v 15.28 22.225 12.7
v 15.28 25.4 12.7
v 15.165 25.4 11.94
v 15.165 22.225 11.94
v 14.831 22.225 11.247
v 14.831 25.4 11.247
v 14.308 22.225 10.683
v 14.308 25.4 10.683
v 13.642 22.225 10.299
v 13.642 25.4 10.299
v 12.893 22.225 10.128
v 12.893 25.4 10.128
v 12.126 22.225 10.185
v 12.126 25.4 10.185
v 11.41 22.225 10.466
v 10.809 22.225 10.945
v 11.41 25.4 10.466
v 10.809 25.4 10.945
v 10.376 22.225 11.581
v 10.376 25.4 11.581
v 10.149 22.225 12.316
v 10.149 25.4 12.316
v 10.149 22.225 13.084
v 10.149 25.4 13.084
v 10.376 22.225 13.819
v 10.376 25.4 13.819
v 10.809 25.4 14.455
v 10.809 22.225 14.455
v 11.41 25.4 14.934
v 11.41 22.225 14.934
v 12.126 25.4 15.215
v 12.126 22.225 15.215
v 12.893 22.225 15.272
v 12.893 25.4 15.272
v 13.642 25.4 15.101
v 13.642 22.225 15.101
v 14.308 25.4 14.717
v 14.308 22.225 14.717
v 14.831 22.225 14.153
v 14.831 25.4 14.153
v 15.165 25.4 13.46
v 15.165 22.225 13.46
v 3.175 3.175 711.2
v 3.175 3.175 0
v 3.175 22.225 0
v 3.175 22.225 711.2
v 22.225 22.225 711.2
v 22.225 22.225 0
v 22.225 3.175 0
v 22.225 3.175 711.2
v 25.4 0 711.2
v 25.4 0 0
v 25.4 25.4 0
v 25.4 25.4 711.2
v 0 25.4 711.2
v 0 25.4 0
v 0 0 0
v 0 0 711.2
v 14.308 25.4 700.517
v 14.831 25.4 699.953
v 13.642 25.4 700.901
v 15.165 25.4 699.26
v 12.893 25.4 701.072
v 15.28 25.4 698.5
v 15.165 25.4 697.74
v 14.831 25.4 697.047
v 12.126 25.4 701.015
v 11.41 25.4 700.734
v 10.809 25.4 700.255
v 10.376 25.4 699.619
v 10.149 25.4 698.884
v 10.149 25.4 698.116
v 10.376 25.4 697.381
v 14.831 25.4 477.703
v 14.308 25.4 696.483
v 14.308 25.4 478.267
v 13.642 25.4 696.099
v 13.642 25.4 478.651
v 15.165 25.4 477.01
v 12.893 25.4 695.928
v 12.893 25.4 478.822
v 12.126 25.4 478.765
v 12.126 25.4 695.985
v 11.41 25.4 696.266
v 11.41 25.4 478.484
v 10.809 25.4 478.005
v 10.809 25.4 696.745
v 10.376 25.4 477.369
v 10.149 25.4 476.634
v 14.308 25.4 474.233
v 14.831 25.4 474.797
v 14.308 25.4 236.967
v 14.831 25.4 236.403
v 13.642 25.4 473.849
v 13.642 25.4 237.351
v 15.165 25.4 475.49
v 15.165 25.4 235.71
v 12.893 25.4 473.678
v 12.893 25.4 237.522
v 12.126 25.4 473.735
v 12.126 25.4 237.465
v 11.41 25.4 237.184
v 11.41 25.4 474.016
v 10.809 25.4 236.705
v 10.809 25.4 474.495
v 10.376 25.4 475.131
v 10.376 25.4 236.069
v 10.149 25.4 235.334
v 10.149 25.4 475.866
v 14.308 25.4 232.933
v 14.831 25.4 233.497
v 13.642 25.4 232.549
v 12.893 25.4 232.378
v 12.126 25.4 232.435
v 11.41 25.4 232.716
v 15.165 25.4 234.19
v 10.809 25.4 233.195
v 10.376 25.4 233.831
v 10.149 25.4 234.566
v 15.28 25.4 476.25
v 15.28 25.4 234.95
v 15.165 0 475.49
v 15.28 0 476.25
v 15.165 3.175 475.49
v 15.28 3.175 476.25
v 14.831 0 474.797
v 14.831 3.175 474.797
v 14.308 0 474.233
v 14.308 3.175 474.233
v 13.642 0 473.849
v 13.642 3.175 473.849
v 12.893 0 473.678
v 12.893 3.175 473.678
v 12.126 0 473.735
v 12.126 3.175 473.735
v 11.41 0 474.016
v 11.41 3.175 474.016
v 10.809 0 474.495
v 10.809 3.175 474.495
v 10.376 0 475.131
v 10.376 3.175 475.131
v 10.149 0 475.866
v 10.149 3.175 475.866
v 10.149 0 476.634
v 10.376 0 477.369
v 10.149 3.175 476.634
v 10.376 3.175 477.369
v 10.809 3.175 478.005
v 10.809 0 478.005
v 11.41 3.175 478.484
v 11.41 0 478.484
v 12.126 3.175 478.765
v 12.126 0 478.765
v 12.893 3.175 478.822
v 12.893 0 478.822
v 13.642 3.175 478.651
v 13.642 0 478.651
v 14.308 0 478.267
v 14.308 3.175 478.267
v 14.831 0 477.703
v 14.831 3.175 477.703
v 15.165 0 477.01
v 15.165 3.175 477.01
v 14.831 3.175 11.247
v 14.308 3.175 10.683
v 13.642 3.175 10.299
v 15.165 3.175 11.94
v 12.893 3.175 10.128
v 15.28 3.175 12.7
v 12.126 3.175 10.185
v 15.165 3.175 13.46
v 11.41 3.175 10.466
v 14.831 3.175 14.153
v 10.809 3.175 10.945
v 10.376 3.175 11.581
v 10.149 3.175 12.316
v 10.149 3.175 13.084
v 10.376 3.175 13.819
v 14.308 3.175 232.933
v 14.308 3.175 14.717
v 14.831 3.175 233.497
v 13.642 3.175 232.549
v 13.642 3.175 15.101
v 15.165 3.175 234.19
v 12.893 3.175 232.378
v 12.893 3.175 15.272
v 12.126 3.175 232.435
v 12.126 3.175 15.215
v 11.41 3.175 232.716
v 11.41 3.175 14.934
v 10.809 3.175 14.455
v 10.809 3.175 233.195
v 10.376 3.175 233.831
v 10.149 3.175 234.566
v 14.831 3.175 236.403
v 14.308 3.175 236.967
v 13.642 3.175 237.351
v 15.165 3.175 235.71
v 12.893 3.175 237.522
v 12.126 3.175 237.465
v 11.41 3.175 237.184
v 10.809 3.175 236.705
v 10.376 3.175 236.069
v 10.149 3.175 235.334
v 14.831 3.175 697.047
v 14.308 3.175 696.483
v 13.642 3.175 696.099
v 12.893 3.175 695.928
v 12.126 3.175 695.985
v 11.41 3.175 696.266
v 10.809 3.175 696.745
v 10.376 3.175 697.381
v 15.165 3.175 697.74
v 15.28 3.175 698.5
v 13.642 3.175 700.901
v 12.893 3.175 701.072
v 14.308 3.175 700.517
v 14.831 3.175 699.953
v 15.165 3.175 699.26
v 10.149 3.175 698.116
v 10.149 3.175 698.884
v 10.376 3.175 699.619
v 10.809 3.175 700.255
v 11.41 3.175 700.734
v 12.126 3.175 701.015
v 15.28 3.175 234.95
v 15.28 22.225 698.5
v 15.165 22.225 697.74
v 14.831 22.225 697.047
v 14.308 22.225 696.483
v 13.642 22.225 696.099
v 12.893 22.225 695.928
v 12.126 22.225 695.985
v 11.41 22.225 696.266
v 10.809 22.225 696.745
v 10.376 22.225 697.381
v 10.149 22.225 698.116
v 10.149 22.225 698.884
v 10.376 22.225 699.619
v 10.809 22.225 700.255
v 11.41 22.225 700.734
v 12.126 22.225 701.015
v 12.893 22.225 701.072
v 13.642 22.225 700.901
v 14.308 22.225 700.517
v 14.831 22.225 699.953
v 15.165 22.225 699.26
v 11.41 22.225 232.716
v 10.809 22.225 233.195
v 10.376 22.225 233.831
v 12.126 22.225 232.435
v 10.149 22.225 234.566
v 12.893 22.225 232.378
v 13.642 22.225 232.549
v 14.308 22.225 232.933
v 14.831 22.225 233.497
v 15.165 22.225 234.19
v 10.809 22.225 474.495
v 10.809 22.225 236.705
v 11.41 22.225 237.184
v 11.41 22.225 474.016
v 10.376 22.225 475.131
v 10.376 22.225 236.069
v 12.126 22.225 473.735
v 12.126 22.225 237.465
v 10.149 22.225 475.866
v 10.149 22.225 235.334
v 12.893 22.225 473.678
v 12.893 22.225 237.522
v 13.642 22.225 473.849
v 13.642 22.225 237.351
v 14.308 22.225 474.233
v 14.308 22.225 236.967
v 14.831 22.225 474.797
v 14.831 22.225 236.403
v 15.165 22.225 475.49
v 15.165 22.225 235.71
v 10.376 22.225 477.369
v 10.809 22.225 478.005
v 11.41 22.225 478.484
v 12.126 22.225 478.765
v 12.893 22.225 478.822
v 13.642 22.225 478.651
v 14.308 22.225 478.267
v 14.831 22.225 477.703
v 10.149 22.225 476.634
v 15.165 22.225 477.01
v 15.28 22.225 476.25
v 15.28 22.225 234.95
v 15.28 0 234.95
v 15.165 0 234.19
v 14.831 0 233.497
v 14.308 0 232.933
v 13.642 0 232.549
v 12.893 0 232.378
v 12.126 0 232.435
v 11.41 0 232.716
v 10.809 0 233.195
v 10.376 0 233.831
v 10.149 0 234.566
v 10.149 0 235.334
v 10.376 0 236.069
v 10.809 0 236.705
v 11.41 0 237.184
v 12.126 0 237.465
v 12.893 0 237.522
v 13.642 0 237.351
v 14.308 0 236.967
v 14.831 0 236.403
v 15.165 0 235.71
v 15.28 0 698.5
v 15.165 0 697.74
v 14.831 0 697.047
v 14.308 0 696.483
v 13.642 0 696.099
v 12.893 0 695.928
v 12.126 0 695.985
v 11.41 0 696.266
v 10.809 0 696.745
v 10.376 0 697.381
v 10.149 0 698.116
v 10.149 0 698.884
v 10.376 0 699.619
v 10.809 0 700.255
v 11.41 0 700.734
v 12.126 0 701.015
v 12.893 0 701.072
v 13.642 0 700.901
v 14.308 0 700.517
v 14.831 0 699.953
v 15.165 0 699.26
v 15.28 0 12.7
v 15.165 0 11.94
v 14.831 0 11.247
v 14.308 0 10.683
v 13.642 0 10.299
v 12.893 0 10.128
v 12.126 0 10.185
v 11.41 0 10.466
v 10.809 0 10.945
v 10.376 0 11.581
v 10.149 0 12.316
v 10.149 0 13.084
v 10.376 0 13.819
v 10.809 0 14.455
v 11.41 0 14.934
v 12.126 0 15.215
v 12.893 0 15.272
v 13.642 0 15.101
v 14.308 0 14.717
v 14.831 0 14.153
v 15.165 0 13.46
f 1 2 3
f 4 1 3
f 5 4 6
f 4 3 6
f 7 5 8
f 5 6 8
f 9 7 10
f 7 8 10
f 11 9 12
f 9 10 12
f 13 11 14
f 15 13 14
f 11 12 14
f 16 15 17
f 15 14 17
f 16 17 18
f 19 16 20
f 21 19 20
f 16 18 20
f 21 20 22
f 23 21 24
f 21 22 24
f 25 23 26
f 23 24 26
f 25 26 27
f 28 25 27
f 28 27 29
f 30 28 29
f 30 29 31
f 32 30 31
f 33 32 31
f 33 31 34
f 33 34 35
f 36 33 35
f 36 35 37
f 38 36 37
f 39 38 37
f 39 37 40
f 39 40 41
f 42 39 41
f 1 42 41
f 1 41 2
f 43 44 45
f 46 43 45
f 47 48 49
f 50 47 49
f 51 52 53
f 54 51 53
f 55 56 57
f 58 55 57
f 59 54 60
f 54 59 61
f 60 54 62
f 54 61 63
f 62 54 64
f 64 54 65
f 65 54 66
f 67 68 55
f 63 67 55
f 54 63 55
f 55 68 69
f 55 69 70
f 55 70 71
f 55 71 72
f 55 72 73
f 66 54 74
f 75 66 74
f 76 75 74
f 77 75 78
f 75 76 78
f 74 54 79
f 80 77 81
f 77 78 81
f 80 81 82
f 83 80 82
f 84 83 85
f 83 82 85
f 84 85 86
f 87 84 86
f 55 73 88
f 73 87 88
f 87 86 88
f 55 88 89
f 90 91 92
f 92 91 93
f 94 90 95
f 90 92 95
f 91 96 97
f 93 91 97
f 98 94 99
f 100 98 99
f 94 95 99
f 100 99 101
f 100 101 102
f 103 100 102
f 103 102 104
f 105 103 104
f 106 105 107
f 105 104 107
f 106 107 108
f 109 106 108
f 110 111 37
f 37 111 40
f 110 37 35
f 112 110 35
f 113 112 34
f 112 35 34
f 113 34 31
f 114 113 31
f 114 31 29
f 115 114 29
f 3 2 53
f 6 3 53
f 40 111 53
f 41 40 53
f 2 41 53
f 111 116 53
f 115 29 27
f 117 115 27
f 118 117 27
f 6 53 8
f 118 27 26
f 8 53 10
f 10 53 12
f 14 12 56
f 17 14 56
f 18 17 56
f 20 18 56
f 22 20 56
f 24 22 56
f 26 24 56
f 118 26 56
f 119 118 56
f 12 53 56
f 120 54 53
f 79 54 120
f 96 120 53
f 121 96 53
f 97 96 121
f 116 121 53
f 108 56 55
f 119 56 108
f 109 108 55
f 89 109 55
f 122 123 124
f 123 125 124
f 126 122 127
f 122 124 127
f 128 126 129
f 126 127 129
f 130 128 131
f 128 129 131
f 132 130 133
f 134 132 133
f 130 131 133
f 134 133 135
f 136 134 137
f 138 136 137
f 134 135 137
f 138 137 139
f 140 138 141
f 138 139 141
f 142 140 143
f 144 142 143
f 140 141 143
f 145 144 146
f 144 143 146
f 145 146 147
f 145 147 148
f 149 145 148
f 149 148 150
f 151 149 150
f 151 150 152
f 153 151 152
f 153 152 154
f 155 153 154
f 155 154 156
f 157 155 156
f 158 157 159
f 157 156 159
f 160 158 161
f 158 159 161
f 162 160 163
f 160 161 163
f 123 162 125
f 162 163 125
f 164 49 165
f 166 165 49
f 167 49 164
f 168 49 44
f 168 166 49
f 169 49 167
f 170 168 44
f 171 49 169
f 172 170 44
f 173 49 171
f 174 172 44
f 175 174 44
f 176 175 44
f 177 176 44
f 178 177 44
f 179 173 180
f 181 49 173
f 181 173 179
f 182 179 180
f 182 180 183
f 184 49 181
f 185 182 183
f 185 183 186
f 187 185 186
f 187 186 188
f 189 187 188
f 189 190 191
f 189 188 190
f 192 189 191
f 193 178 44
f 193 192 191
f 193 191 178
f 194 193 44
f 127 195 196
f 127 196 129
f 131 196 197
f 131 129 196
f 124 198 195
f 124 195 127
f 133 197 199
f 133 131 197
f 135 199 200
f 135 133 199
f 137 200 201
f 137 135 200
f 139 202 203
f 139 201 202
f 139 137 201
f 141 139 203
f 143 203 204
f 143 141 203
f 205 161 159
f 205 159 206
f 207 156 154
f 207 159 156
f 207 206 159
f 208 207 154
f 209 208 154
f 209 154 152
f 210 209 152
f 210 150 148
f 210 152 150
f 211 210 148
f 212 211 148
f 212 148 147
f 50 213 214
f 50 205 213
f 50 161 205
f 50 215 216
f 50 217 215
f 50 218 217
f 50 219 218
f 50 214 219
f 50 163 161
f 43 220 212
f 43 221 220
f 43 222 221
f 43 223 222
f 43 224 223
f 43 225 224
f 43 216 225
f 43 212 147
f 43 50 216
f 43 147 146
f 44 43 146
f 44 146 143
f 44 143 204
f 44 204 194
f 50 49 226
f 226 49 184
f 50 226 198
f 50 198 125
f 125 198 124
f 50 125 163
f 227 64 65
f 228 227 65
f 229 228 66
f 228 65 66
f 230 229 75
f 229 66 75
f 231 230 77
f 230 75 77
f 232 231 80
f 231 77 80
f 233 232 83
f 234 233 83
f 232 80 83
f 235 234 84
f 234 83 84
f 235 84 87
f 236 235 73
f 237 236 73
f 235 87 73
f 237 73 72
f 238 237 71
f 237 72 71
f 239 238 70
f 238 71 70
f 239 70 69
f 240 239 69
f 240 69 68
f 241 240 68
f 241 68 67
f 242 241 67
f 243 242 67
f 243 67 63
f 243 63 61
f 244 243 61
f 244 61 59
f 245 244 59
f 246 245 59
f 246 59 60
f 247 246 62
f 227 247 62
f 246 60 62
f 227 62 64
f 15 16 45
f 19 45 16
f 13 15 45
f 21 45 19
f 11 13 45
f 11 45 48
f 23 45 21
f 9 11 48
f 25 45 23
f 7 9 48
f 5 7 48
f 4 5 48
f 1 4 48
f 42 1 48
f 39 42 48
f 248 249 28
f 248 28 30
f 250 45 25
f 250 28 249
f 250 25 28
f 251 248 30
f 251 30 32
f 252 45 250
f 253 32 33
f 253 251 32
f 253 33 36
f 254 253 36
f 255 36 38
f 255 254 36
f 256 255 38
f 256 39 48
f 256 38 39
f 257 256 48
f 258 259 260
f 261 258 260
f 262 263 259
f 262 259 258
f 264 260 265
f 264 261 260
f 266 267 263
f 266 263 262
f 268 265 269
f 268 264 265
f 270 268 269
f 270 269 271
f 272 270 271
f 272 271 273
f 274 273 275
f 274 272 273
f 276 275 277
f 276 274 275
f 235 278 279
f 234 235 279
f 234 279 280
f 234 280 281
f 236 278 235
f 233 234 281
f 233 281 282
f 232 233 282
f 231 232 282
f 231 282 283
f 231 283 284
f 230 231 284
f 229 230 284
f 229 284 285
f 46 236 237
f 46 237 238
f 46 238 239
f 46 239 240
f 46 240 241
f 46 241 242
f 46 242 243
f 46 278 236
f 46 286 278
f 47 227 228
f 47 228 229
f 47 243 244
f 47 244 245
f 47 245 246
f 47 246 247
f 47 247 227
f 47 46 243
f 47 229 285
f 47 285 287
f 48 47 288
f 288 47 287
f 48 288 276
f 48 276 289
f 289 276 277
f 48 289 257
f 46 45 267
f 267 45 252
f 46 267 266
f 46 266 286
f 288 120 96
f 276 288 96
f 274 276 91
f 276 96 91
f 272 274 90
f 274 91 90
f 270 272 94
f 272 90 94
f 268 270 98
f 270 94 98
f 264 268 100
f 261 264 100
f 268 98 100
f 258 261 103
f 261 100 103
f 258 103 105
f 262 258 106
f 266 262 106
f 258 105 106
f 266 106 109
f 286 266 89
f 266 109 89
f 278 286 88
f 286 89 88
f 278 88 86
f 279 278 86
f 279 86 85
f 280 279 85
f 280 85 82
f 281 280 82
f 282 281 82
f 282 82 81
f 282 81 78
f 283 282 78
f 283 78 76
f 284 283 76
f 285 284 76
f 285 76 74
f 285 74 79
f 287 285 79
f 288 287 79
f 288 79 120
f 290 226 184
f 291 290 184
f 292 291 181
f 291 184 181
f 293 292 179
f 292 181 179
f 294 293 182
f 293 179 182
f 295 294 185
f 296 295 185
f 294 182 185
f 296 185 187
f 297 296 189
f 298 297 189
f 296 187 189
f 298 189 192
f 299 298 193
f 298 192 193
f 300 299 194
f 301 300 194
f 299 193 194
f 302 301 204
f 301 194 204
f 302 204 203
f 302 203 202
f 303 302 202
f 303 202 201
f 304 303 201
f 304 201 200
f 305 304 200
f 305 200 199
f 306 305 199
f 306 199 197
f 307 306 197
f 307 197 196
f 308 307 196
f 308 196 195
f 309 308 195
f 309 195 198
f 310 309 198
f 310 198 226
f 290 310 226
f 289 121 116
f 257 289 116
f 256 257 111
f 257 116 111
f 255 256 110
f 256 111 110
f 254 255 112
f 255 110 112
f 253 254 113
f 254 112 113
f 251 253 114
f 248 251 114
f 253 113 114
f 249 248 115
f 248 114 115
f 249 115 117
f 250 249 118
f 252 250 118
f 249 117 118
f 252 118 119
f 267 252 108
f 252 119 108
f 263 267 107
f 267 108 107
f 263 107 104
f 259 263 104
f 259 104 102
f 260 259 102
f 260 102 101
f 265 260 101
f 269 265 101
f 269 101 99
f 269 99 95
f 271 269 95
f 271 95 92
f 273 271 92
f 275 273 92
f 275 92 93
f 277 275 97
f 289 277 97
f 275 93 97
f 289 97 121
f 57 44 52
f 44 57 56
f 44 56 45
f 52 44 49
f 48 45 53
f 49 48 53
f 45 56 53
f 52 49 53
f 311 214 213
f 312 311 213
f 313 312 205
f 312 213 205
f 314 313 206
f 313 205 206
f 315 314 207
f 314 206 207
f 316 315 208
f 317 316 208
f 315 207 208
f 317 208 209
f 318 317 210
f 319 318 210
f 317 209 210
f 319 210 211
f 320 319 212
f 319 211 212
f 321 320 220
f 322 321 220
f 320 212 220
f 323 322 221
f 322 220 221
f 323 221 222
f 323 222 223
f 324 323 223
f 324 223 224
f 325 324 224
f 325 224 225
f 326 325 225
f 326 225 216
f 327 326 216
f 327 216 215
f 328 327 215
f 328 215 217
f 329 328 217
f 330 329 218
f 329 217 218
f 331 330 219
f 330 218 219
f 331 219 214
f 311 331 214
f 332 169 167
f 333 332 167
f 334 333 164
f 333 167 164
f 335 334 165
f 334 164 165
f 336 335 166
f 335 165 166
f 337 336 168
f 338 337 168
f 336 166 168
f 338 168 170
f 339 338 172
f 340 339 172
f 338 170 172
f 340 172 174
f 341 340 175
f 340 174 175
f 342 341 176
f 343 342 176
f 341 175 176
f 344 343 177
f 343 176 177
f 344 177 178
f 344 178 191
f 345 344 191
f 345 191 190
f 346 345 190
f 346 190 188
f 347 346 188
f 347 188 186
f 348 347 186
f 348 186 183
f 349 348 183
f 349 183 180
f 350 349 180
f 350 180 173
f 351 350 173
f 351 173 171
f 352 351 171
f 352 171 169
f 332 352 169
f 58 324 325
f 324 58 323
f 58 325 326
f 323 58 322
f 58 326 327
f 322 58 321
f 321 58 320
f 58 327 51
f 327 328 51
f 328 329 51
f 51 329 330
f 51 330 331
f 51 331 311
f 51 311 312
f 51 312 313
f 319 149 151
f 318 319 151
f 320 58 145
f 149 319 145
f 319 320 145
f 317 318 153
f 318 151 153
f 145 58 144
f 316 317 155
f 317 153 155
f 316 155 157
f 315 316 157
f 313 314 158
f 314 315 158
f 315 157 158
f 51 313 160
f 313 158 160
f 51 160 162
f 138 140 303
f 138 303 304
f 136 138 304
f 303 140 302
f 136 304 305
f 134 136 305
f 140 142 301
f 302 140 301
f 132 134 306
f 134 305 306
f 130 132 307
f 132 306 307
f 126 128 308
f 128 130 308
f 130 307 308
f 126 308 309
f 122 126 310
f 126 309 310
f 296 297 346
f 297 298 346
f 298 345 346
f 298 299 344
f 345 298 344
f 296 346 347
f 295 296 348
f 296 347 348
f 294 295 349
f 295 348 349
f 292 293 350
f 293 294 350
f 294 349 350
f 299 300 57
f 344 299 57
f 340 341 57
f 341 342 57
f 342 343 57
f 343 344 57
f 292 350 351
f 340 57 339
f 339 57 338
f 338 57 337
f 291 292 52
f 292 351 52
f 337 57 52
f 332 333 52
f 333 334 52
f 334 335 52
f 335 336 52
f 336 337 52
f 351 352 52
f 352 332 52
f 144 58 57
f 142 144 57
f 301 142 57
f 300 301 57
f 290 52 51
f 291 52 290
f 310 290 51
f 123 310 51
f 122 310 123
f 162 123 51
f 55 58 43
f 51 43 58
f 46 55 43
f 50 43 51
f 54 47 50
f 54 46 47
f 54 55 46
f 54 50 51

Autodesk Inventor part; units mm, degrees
ref_plane "YZ Plane" through (0, 0, 0) normal (1, 0, 0) x (0, 1, 0)
ref_plane "XZ Plane" through (0, 0, 0) normal (0, 1, 0) x (-1, 0, 0)
ref_plane "XY Plane" through (0, 0, 0) normal (0, 0, 1) x (1, 0, 0)
sketch "Sketch1" plane through (0, 0, 0) normal (0, 0, 1) x (1, 0, 0)
  line L0 (0, 0) -> (25.4, 0)
  line L1 (25.4, 0) -> (25.4, 25.4)
  line L2 (25.4, 25.4) -> (0, 25.4)
  line L3 (0, 25.4) -> (0, 0)
  dimension "d0" = 25.4
  dimension "d1" = 25.4
extrude "Extrusion1" add sketch "Sketch1" along normal blind 711.2
sketch "Sketch2" plane through (0, 25.4, 0) normal (0, 1, 0) x (1, 0, 0)
  line L0 (0, -711.2) -> (25.4, -711.2) construction
  line L1 (12.7, -711.2) -> (12.7, -698.5) construction
  circle A0 centre (12.7, -698.5) radius 2.5797
  line L2 (12.7, -711.2) -> (12.7, -476.25) construction
  circle A1 centre (12.7, -476.25) radius 2.5797
  line L3 (0, 0) -> (0, -711.2) construction
  line L4 (0, -355.6) -> (25.4, -355.6) construction
  circle A2 centre (12.7, -12.7) radius 2.5797
  circle A3 centre (12.7, -234.95) radius 2.5797
  dimension "d4" = 12.7
  dimension "d5" = 5.1594
  dimension "d6" = 234.95
  dimension "d7" = 5.1594
extrude "Extrusion2" cut sketch "Sketch2" against normal blind 711.2
sketch "Sketch3" plane through (0, 0, 711.2) normal (0, 0, 1) x (1, 0, 0)
  line L0 (25.4, 25.4) -> (0, 25.4) projected
  line L1 (25.4, 0) -> (25.4, 25.4) projected
  line L2 (0, 25.4) -> (0, 0) projected
  line L3 (0, 0) -> (25.4, 0) projected
  line L4 (3.175, 22.225) -> (22.225, 22.225)
  line L5 (22.225, 22.225) -> (22.225, 3.175)
  line L6 (22.225, 3.175) -> (3.175, 3.175)
  line L7 (3.175, 3.175) -> (3.175, 22.225)
  dimension "d10" = 3.175
extrude "Extrusion3" cut sketch "Sketch3" against normal blind 762 contours L4 L5 L6 L7
properties part number "bumper runner"
